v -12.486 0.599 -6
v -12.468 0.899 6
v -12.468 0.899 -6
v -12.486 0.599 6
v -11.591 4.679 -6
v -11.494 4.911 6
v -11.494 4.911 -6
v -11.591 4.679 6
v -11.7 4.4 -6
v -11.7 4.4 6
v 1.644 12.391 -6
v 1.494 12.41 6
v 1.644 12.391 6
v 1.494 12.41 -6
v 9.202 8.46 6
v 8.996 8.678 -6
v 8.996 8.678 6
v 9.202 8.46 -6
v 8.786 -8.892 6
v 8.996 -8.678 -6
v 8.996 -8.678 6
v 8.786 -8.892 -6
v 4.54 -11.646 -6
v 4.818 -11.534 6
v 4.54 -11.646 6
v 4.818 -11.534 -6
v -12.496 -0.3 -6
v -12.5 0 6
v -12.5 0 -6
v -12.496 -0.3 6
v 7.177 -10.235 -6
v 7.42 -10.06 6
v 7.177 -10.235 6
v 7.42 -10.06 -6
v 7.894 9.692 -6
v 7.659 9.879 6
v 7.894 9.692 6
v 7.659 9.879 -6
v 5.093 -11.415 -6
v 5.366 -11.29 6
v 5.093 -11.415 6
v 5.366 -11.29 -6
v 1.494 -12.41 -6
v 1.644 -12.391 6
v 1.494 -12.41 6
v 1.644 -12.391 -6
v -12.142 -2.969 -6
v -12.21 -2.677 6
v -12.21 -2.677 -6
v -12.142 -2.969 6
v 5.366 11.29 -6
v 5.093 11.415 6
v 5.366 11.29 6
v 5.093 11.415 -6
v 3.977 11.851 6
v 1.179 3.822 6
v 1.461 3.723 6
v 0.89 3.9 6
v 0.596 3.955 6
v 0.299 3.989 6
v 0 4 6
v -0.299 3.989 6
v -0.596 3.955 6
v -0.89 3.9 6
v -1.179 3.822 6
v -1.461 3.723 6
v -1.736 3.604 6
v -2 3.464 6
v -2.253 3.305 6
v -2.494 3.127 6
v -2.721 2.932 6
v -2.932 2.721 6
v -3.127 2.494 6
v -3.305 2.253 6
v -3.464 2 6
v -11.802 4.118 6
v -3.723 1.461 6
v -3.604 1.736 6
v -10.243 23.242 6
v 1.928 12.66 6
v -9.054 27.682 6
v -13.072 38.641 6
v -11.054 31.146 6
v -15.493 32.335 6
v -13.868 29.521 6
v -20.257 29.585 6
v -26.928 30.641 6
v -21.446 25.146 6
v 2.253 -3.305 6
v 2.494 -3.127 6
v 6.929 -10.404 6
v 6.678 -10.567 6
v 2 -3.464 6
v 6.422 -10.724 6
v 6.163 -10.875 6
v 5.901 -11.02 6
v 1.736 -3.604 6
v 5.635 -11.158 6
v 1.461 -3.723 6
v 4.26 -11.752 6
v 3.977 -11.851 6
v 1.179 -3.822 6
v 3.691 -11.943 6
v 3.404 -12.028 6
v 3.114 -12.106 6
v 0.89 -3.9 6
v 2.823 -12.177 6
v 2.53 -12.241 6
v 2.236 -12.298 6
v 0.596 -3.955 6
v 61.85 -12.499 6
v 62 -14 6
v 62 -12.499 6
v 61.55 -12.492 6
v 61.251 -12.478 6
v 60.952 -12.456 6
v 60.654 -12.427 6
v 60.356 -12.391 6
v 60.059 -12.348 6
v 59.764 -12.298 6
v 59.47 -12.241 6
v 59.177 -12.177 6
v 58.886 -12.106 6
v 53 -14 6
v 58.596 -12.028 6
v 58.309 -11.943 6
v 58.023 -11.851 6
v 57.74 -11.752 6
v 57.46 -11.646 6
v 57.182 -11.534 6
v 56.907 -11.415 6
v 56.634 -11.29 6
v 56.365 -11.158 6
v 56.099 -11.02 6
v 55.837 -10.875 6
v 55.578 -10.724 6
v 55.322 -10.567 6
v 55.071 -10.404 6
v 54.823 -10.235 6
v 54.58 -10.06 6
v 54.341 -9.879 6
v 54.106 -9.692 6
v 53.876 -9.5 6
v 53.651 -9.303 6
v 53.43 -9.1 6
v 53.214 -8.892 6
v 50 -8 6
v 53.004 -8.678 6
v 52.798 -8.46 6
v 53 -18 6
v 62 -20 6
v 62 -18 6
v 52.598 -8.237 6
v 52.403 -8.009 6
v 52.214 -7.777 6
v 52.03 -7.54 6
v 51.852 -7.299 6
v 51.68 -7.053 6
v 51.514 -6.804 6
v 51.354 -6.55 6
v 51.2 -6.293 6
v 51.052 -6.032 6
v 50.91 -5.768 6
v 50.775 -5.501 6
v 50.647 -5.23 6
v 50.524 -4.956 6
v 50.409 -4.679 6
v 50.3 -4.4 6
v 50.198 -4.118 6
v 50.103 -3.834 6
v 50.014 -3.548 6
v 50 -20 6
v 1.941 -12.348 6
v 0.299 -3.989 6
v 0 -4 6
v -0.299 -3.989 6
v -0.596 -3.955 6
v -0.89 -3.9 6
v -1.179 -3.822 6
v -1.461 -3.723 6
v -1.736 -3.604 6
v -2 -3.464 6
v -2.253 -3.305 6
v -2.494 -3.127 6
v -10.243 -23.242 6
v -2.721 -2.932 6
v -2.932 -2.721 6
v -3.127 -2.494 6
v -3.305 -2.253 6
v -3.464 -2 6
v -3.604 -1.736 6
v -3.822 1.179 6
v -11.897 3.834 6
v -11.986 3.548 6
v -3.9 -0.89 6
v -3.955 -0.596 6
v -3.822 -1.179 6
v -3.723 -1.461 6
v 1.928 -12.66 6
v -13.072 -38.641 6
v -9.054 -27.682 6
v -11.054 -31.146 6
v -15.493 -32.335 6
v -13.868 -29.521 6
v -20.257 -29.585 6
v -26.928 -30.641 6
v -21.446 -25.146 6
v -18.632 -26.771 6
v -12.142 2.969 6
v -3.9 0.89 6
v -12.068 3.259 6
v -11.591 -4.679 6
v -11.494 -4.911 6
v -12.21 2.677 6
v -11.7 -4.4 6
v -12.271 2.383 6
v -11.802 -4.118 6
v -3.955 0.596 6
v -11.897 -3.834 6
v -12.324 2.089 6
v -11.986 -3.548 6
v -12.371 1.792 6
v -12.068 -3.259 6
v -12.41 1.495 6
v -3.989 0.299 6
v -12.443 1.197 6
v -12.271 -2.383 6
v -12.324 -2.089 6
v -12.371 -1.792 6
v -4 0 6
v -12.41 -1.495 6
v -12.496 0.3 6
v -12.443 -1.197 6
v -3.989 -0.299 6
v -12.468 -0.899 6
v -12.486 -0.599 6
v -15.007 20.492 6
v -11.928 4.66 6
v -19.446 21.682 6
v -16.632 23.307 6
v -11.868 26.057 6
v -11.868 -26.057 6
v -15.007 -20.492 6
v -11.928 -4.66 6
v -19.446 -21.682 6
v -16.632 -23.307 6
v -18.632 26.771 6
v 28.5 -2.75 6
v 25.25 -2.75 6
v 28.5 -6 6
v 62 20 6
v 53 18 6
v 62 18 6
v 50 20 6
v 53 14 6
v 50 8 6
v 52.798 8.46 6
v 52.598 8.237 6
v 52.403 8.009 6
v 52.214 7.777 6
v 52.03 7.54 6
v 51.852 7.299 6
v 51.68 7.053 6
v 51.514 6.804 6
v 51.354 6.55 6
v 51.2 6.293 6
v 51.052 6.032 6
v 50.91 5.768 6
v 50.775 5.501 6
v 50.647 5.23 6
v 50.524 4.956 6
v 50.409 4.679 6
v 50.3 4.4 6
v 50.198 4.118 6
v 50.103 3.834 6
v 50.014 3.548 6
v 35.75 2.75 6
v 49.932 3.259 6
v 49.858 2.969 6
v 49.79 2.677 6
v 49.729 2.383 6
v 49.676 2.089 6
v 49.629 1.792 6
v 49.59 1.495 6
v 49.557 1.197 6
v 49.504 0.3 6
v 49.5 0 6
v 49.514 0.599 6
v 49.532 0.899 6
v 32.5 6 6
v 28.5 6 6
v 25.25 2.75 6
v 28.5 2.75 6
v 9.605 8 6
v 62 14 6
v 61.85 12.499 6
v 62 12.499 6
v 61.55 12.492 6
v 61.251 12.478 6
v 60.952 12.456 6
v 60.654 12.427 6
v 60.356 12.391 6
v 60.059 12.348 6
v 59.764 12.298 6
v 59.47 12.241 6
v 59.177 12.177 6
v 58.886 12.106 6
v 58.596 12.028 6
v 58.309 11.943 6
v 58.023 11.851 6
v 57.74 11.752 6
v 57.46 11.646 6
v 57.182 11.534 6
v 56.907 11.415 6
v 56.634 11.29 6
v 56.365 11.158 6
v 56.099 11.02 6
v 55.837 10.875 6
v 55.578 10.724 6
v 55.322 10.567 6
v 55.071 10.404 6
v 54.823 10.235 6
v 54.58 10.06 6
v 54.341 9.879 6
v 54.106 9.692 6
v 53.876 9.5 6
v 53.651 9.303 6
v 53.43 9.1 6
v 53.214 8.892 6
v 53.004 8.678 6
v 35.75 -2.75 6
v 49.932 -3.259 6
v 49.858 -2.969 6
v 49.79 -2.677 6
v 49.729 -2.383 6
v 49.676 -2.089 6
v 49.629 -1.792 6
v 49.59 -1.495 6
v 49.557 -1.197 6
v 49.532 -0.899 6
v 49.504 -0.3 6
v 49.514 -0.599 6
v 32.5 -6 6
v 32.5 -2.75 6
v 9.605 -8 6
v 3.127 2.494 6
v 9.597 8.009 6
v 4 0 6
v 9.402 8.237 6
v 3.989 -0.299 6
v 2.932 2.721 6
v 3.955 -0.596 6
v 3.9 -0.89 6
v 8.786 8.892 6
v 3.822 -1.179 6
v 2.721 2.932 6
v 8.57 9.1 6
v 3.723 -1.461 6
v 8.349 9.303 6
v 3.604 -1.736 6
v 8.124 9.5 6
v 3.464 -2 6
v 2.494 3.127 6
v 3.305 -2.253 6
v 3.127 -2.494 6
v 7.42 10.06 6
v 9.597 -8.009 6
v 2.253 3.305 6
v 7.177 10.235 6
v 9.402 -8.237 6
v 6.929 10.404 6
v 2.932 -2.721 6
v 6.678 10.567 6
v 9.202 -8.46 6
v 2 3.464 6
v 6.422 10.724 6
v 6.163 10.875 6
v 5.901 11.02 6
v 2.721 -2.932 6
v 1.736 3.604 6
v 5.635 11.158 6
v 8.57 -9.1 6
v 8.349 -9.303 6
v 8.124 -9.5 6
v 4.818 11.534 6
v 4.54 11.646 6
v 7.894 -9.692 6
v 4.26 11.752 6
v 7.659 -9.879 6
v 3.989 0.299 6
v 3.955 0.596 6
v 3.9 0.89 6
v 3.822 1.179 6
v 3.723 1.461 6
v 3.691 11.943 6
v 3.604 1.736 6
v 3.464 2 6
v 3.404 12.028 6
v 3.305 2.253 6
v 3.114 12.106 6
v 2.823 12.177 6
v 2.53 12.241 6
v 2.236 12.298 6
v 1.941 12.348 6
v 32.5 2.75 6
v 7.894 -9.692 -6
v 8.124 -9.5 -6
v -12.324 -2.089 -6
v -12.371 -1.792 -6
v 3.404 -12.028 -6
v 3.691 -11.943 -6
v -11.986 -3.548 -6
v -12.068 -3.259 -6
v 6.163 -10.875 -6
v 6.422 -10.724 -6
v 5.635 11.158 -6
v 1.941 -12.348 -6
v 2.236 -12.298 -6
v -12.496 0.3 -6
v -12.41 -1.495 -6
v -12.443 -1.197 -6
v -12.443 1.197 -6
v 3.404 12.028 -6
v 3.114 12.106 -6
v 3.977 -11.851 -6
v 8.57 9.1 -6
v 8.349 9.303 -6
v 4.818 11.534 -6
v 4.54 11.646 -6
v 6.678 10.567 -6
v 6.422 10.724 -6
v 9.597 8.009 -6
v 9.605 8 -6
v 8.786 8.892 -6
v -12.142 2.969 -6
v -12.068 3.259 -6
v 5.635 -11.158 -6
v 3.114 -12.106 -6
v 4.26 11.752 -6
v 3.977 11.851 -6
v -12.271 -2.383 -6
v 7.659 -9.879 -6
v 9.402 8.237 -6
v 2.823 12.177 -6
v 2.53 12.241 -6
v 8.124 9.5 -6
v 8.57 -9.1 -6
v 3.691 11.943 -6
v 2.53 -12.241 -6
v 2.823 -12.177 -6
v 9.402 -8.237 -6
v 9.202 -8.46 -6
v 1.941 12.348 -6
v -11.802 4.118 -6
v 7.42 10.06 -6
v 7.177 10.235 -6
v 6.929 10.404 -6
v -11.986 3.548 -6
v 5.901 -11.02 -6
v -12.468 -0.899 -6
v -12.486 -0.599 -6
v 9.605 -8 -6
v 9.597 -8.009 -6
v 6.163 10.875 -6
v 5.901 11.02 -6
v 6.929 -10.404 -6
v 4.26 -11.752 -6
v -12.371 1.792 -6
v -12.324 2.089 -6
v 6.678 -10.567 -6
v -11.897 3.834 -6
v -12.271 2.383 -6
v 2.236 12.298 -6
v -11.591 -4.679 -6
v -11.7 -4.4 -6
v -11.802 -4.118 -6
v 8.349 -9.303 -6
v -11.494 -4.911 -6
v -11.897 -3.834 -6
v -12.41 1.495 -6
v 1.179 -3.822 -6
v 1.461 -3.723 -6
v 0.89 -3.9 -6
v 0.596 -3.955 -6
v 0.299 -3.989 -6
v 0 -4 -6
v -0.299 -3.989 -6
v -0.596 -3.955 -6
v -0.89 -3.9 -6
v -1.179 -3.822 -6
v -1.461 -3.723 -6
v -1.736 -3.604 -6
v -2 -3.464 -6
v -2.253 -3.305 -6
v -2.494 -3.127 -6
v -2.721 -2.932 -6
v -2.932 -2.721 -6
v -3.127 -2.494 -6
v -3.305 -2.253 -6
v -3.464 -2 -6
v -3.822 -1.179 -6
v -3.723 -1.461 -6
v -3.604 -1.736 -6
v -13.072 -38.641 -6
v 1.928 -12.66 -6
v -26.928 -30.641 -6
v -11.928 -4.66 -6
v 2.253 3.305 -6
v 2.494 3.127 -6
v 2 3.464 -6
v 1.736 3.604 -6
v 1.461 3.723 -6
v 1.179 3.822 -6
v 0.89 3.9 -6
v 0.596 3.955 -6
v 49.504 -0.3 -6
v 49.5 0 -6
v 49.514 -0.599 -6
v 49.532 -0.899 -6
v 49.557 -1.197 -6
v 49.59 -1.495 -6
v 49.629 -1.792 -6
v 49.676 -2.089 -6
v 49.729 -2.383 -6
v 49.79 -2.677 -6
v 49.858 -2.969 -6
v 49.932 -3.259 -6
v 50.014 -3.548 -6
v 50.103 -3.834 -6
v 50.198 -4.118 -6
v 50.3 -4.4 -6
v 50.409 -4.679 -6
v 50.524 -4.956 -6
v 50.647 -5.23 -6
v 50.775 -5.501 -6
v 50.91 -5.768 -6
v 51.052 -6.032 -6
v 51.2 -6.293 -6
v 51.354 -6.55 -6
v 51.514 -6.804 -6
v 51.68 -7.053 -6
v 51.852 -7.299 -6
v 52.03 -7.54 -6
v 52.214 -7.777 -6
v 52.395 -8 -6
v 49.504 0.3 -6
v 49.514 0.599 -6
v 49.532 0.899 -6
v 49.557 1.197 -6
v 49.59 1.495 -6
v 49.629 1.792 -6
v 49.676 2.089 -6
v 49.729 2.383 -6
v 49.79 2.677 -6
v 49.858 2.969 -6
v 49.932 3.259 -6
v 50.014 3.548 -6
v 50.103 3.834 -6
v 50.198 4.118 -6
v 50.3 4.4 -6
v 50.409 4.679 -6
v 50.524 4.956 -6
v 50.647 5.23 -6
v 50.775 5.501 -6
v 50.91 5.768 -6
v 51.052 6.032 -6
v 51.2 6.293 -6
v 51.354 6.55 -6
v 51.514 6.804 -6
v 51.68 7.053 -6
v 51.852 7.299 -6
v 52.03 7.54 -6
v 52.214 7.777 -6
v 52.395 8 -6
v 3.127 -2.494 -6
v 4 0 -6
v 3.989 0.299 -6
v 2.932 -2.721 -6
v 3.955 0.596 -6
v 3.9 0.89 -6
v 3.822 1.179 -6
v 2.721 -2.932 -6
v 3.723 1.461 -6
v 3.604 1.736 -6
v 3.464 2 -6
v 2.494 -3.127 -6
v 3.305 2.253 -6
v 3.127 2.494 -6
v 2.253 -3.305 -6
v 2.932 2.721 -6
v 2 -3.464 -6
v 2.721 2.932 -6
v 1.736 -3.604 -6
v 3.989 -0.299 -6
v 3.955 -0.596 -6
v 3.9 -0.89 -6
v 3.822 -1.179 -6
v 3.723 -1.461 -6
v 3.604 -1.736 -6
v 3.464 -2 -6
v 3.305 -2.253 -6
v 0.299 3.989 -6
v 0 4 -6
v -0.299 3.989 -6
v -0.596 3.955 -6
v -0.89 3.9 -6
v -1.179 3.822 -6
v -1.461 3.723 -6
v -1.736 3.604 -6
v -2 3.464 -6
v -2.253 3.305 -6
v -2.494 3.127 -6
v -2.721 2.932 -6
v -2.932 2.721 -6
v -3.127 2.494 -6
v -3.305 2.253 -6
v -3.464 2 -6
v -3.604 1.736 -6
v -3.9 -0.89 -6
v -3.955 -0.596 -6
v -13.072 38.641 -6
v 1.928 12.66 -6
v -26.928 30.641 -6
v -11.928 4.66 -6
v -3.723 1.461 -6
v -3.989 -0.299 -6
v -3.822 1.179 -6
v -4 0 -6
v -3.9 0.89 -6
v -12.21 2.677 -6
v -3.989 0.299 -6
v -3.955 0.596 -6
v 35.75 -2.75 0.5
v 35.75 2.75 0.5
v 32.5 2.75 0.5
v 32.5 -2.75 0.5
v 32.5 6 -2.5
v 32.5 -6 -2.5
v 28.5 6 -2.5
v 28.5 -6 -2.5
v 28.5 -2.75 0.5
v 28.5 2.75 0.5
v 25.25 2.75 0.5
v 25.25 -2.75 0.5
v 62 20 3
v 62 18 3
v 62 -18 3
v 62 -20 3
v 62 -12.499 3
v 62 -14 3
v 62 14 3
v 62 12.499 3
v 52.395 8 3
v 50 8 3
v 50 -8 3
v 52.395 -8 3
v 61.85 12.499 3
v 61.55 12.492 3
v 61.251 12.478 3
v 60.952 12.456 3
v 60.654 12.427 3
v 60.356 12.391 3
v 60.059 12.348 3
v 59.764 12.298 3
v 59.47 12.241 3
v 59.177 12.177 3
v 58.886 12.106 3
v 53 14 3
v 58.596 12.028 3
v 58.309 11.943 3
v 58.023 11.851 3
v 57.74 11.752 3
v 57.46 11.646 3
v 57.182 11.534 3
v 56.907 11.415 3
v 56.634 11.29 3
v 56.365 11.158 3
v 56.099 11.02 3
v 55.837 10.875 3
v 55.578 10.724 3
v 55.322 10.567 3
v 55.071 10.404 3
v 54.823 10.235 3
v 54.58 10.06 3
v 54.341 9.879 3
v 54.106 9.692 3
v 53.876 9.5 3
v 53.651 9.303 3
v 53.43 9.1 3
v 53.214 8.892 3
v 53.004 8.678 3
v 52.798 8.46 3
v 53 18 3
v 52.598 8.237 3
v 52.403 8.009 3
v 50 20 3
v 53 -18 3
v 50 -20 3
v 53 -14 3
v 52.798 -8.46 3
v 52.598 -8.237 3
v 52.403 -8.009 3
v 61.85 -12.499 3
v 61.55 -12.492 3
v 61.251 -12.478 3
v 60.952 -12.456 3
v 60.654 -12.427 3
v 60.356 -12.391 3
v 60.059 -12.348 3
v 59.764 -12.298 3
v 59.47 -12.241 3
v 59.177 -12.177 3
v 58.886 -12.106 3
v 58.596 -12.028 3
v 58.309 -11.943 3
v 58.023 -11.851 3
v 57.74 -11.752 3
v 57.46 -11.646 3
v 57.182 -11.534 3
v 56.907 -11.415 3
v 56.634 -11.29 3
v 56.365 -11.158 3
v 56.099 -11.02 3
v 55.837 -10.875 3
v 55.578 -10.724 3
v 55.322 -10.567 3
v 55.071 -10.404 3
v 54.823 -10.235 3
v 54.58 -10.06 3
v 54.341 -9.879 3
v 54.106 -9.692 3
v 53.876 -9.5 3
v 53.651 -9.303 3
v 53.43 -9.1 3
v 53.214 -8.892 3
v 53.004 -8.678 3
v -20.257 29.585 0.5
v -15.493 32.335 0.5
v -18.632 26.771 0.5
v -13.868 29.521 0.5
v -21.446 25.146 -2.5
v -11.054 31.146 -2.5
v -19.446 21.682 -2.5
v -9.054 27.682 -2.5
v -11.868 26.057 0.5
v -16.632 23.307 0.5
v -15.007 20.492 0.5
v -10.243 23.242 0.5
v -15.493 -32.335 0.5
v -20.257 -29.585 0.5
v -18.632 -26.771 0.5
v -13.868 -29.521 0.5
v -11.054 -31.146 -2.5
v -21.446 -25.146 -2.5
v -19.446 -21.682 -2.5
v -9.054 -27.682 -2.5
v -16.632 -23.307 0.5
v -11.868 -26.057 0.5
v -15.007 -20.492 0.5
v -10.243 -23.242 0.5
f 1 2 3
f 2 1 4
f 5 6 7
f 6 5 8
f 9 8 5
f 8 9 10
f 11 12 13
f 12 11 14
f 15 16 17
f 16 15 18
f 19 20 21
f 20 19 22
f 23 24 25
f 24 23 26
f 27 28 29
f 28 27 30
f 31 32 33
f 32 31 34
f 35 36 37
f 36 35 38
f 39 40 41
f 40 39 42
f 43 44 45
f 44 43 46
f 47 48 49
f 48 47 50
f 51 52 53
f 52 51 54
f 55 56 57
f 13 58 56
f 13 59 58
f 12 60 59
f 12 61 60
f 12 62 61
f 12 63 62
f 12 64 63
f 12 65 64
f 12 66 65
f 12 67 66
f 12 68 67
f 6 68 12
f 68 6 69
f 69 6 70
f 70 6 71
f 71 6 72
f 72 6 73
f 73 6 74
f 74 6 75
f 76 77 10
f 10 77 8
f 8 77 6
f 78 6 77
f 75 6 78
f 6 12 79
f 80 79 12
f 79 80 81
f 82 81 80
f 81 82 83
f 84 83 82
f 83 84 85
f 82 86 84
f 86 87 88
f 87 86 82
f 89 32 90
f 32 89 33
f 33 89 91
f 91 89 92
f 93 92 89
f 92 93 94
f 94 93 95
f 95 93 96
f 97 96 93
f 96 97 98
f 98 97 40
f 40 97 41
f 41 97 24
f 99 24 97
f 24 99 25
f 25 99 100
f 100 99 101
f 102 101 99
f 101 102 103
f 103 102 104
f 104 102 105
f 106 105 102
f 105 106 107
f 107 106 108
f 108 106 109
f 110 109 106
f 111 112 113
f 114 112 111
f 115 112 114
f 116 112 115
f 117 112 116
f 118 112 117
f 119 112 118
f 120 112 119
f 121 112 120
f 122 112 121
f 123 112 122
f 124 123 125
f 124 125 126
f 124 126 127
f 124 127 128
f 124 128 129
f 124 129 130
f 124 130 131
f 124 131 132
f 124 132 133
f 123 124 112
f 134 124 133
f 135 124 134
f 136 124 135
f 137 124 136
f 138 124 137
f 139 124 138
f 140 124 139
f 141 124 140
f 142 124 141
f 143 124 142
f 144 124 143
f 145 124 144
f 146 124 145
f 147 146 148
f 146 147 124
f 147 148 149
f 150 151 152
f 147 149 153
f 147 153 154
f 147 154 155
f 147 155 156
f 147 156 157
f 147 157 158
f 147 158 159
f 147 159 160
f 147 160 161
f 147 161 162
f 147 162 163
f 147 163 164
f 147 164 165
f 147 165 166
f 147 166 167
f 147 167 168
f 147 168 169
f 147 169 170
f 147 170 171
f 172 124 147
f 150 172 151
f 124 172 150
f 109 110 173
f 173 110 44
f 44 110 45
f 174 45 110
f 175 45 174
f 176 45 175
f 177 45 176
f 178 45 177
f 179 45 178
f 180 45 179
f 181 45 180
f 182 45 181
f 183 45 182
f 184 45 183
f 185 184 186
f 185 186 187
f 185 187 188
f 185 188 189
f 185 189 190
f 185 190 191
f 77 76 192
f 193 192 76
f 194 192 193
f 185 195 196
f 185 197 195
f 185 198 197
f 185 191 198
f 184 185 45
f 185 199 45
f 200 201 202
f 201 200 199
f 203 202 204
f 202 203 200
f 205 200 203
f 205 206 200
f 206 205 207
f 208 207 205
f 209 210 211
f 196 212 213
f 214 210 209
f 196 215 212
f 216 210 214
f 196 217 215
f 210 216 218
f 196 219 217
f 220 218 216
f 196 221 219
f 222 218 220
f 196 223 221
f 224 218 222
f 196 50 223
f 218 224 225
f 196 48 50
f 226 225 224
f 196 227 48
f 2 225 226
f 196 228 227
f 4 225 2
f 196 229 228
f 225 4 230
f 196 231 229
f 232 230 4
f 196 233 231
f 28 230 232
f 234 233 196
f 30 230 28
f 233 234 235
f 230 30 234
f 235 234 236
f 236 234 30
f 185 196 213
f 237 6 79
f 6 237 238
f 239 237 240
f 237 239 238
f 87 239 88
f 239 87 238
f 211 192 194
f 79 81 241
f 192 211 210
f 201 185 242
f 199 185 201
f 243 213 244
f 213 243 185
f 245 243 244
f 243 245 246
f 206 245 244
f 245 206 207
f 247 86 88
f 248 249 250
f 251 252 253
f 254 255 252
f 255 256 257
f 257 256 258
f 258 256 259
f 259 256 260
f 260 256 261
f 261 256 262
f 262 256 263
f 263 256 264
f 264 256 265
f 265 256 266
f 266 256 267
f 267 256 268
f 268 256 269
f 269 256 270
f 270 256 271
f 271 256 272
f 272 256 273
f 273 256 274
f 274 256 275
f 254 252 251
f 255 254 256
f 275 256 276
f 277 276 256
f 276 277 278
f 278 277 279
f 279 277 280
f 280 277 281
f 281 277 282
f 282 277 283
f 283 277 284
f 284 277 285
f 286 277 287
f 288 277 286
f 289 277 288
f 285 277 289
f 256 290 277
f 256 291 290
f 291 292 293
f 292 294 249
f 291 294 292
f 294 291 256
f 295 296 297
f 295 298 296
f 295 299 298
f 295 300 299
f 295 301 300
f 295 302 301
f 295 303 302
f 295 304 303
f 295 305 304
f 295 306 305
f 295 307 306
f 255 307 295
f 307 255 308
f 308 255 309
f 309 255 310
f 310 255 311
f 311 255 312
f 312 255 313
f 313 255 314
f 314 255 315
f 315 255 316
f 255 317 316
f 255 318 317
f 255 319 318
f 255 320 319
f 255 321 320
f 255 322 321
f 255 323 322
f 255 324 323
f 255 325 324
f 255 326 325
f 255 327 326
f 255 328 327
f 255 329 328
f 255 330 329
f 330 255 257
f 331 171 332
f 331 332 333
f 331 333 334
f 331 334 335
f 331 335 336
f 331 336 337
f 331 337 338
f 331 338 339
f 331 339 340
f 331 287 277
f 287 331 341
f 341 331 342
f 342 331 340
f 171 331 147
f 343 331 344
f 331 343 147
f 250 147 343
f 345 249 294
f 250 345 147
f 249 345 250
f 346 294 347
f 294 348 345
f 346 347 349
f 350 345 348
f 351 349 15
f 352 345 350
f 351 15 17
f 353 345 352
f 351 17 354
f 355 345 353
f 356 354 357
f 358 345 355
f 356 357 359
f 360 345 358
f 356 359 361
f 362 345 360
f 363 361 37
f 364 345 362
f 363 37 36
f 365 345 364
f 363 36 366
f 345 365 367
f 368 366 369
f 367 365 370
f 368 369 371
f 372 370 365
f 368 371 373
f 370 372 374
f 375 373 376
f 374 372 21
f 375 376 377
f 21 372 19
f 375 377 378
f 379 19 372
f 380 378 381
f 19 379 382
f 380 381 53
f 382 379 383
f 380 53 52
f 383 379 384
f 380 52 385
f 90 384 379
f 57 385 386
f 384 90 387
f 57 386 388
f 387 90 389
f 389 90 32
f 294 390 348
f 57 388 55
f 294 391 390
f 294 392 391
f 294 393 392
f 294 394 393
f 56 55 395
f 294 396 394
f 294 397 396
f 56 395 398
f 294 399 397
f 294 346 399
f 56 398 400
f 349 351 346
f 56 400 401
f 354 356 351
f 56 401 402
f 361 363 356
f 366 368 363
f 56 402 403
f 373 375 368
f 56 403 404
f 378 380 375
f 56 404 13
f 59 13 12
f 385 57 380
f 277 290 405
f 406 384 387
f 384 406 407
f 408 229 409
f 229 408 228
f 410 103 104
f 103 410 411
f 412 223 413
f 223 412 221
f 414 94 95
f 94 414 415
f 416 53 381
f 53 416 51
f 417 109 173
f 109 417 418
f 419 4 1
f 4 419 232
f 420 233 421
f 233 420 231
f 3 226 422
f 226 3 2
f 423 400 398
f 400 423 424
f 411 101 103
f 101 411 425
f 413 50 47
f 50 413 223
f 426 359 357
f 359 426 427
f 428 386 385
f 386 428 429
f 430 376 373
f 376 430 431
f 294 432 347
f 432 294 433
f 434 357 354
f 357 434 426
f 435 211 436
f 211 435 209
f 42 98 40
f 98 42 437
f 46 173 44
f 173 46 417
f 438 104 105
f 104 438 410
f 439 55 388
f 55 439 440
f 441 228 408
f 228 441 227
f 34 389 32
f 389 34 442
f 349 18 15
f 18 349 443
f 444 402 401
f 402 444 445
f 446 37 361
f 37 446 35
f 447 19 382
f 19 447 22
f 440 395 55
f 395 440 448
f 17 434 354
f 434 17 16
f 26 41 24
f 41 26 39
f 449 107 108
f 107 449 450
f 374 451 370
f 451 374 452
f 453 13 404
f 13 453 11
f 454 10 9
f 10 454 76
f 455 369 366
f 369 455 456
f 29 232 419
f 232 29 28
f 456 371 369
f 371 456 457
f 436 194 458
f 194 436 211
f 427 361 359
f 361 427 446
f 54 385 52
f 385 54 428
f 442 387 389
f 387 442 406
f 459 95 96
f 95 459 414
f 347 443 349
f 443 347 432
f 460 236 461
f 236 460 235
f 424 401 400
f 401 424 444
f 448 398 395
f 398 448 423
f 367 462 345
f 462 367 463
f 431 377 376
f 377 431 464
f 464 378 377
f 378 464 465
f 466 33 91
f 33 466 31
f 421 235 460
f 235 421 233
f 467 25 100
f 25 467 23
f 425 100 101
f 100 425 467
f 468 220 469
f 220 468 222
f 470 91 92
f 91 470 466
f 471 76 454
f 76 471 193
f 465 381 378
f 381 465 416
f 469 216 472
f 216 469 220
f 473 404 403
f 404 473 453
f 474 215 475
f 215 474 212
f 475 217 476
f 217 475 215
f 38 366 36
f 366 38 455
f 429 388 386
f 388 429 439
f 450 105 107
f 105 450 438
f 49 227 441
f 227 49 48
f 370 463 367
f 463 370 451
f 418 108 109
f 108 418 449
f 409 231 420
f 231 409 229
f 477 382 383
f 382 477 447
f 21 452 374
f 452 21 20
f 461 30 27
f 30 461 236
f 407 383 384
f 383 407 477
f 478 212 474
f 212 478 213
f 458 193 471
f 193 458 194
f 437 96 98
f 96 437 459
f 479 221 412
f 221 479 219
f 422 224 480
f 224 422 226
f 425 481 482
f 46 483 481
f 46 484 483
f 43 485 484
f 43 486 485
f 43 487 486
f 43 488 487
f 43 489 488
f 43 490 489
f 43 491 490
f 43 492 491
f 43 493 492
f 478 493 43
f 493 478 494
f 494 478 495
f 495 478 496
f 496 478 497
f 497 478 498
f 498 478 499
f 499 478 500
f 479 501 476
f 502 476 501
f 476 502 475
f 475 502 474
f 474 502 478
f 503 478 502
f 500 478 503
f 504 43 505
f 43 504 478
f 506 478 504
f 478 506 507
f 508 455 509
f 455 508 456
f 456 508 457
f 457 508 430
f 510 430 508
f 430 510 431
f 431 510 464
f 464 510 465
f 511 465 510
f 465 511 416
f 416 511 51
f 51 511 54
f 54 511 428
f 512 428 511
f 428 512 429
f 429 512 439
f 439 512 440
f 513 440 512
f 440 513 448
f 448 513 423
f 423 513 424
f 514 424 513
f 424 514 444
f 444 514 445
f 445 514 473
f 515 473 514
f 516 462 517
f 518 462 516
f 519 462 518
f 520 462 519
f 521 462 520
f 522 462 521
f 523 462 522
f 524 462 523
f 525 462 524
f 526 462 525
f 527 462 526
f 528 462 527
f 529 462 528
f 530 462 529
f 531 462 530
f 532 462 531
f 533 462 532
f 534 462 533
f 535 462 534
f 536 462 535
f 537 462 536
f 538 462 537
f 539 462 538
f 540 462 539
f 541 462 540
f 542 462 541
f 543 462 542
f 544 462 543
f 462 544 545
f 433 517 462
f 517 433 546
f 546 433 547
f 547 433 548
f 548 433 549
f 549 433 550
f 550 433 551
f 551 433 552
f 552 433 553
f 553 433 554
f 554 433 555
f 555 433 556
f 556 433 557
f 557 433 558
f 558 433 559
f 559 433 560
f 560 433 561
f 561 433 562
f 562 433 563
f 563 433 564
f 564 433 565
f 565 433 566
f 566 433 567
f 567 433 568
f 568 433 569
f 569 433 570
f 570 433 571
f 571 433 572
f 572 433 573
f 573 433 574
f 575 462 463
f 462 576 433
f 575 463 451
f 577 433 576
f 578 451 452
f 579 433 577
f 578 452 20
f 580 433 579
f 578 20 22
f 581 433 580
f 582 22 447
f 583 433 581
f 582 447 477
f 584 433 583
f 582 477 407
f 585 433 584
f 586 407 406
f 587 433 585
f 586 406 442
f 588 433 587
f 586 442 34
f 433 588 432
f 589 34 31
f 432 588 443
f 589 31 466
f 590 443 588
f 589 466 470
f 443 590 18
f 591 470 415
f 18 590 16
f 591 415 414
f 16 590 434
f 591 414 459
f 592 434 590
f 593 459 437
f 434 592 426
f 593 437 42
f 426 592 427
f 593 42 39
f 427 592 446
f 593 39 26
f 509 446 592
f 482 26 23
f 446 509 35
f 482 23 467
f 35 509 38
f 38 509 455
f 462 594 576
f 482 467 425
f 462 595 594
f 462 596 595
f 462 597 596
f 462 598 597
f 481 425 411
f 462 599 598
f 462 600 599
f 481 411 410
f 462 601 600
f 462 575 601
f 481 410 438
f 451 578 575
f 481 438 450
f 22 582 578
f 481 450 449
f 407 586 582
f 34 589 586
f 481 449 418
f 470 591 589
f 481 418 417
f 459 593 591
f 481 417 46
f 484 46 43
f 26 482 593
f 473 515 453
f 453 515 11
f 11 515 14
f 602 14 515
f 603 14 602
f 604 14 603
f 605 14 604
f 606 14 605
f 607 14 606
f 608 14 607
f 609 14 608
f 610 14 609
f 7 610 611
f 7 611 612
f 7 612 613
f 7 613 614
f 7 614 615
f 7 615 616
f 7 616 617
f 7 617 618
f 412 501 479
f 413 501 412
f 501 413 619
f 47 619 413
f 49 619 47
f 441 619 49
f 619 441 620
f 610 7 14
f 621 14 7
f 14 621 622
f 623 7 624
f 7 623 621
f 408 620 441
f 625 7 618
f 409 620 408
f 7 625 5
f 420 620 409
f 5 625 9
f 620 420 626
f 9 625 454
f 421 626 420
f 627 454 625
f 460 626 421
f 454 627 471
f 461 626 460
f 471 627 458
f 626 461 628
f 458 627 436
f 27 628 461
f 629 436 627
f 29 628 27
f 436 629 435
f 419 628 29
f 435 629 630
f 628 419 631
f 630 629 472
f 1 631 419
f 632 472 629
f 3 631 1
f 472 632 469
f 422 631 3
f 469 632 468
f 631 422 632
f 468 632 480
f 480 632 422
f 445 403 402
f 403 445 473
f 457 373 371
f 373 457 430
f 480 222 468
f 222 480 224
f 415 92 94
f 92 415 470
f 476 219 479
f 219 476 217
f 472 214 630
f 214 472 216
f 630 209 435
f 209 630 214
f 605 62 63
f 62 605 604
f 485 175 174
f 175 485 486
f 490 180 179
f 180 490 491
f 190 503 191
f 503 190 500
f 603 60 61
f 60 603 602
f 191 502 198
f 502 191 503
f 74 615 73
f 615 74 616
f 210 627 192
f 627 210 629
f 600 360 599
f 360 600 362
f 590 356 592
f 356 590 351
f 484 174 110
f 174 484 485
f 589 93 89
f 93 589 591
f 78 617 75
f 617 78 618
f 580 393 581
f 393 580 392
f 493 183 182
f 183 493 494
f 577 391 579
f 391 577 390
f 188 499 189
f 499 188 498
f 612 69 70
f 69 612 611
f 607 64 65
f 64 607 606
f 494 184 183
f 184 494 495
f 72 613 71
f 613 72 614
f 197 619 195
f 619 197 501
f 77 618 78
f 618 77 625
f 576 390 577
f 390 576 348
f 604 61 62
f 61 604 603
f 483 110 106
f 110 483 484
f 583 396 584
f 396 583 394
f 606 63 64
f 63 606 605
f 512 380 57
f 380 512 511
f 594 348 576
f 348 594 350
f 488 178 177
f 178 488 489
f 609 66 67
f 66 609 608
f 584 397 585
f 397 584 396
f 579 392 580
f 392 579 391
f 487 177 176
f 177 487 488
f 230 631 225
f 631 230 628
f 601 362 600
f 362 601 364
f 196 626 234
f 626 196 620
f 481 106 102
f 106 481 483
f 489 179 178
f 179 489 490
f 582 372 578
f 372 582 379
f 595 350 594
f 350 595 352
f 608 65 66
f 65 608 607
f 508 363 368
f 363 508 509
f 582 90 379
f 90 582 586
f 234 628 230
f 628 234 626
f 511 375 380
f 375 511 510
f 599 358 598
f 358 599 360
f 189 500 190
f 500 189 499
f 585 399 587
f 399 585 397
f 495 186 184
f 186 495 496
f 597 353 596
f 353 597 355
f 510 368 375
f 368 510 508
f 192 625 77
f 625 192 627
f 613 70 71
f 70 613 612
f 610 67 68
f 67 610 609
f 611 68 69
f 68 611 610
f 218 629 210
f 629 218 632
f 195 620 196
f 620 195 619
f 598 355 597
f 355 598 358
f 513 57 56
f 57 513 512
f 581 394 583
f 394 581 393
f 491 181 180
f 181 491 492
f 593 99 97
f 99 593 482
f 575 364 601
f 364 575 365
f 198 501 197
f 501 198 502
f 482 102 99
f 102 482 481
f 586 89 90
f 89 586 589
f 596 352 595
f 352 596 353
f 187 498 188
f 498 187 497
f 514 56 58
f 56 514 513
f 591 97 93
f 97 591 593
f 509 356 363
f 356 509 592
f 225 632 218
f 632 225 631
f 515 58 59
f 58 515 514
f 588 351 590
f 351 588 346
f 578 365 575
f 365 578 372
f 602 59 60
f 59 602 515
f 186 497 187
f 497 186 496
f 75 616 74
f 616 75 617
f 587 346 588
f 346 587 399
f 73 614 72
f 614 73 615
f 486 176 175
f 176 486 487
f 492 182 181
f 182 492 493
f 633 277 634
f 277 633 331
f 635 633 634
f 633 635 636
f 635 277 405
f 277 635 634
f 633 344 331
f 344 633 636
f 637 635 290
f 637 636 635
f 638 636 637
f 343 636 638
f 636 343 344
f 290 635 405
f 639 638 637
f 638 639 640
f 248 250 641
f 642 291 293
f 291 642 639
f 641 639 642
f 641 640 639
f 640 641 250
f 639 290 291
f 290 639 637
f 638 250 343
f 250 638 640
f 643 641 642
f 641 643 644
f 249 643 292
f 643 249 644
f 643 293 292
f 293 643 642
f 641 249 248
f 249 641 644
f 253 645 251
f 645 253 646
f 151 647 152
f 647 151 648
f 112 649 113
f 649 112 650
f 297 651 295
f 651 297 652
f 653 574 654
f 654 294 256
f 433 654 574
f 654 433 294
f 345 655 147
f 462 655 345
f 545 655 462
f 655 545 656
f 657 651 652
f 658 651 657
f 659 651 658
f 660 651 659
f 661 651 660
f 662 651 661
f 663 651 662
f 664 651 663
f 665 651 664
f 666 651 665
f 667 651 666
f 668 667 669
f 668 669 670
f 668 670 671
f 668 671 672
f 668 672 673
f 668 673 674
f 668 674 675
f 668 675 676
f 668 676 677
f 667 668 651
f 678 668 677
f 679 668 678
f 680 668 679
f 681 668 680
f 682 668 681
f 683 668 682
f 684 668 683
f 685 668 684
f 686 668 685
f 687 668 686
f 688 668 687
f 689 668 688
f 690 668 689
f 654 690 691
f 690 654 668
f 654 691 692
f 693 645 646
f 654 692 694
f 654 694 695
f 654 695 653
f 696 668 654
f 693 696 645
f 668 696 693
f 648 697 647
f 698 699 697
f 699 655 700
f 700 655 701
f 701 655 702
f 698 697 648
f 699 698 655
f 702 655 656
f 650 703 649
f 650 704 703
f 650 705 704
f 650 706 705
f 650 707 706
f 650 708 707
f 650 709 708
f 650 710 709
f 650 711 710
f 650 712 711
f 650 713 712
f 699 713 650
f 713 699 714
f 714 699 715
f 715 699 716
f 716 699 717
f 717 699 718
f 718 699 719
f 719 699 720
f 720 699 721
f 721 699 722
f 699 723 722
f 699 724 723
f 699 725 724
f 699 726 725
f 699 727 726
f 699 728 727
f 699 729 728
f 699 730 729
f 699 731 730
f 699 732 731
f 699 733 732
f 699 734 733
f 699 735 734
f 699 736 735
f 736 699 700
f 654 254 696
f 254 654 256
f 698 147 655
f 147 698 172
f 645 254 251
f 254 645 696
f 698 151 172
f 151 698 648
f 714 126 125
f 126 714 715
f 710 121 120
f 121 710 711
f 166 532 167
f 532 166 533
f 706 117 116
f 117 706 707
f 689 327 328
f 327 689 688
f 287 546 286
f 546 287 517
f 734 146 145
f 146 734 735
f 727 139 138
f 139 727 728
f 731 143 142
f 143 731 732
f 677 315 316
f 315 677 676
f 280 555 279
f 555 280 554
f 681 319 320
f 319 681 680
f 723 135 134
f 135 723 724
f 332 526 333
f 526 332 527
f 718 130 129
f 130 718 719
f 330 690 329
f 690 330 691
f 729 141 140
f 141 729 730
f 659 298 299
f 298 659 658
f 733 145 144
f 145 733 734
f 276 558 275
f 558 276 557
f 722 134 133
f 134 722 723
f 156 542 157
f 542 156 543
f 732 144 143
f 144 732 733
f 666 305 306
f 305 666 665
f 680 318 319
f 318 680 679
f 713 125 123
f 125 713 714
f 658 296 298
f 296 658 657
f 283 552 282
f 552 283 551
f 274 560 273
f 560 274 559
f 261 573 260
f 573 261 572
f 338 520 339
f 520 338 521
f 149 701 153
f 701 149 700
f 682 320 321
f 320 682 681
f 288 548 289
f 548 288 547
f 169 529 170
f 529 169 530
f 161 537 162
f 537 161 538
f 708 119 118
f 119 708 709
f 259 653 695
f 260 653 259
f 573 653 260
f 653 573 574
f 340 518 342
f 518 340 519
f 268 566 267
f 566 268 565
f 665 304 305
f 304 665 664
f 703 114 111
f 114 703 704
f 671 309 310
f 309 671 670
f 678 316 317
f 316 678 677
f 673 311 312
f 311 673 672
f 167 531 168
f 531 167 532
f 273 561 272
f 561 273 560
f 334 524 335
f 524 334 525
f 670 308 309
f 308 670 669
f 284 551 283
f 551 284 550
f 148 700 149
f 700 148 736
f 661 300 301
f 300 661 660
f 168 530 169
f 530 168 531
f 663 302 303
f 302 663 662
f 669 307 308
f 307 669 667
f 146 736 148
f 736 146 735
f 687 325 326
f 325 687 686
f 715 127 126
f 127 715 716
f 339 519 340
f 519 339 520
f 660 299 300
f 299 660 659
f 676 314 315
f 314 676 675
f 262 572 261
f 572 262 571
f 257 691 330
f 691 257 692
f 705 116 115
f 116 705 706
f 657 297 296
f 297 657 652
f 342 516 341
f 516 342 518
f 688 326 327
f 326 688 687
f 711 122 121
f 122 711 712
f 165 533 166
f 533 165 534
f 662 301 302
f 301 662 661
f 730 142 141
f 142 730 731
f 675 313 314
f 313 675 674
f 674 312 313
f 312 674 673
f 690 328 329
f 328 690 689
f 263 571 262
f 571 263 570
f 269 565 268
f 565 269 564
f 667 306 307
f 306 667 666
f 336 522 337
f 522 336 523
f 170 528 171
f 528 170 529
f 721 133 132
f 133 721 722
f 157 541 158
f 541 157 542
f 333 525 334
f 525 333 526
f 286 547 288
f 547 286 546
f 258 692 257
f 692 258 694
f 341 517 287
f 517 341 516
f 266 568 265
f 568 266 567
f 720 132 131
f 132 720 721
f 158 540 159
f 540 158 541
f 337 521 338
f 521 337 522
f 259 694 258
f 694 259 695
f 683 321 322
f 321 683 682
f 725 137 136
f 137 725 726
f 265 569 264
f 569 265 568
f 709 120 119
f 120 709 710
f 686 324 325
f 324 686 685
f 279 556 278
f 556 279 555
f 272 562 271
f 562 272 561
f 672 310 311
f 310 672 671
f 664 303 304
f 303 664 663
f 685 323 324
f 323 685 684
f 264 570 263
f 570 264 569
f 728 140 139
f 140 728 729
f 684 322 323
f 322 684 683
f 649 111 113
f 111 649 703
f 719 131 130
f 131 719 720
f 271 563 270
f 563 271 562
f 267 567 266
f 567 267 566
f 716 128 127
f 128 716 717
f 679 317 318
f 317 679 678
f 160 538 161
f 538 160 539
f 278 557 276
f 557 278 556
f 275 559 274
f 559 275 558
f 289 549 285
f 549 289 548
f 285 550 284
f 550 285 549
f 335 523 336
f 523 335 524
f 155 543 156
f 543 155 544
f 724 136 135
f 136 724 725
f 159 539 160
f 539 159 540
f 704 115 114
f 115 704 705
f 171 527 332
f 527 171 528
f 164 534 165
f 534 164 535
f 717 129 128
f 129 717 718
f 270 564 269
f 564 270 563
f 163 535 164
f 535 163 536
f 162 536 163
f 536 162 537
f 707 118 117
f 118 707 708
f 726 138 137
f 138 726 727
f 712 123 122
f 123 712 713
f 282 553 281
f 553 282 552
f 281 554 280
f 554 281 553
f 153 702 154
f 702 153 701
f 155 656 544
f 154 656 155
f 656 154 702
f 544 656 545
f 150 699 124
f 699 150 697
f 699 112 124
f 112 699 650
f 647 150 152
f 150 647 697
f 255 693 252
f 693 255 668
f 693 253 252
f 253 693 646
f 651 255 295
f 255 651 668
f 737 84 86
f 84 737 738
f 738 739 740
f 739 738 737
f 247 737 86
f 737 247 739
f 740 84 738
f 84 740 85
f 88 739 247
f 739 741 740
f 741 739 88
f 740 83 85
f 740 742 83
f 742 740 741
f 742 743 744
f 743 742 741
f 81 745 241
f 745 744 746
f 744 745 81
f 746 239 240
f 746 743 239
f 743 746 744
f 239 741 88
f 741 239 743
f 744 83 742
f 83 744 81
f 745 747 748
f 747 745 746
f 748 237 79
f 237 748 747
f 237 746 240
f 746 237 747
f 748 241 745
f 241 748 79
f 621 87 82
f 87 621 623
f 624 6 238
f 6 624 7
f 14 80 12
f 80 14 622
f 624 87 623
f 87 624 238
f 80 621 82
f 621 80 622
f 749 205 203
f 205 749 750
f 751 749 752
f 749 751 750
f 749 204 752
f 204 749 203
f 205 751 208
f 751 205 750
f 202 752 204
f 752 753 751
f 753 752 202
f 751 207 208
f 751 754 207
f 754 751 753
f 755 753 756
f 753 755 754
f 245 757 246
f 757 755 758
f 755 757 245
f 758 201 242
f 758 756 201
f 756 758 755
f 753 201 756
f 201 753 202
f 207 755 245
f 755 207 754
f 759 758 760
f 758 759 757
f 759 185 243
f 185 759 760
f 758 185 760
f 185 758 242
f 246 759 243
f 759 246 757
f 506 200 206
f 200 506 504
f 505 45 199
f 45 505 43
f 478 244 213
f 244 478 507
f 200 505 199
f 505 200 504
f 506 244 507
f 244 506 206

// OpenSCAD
$fa = .3;	// minimum angle 
$fs = .3;	// minimum size
difference(){
    translate([0,0,-6])cylinder(h=12,d=25);
    cylinder(h=15,d=8,center=true);
}
rotate([0,0,0]) translate([34,0,0]){
    difference(){ 
        union(){
            difference(){
                cube([56,16,12], center=true);
                rotate([0,0,0])translate([-3.5,0,3.5])screwshadow();
            }
            translate([22,0,4.5])cube([12,40,3],center=true);
        }
        translate([28,0,1])cylinder(h=15,d=25,center=true);
        translate([25,-16,1])cube([12,4,12],center=true);
        translate([25,16,1])cube([12,4,12],center=true);
    }
}
rotate([0,0,120]) translate([25,0,0]){
    difference(){
        cube([30,16,12], center=true);
        rotate([0,0,0])translate([5.5,0,3.5])screwshadow();
    }
}
rotate([0,0,240]) translate([25,0,0]){
    difference(){
        cube([30,16,12], center=true);
        rotate([0,0,0])translate([5.5,0,3.5])screwshadow();
    }
}

//screwshadow();

module screwshadow(){
    translate([3.5,0,3])cube([3.5,5.5,12], center=true);
    translate([0,0,0])cube([4,12,12], center=true);
    translate([-3.5,0,3])cube([3.5,5.5,12], center=true);
}
